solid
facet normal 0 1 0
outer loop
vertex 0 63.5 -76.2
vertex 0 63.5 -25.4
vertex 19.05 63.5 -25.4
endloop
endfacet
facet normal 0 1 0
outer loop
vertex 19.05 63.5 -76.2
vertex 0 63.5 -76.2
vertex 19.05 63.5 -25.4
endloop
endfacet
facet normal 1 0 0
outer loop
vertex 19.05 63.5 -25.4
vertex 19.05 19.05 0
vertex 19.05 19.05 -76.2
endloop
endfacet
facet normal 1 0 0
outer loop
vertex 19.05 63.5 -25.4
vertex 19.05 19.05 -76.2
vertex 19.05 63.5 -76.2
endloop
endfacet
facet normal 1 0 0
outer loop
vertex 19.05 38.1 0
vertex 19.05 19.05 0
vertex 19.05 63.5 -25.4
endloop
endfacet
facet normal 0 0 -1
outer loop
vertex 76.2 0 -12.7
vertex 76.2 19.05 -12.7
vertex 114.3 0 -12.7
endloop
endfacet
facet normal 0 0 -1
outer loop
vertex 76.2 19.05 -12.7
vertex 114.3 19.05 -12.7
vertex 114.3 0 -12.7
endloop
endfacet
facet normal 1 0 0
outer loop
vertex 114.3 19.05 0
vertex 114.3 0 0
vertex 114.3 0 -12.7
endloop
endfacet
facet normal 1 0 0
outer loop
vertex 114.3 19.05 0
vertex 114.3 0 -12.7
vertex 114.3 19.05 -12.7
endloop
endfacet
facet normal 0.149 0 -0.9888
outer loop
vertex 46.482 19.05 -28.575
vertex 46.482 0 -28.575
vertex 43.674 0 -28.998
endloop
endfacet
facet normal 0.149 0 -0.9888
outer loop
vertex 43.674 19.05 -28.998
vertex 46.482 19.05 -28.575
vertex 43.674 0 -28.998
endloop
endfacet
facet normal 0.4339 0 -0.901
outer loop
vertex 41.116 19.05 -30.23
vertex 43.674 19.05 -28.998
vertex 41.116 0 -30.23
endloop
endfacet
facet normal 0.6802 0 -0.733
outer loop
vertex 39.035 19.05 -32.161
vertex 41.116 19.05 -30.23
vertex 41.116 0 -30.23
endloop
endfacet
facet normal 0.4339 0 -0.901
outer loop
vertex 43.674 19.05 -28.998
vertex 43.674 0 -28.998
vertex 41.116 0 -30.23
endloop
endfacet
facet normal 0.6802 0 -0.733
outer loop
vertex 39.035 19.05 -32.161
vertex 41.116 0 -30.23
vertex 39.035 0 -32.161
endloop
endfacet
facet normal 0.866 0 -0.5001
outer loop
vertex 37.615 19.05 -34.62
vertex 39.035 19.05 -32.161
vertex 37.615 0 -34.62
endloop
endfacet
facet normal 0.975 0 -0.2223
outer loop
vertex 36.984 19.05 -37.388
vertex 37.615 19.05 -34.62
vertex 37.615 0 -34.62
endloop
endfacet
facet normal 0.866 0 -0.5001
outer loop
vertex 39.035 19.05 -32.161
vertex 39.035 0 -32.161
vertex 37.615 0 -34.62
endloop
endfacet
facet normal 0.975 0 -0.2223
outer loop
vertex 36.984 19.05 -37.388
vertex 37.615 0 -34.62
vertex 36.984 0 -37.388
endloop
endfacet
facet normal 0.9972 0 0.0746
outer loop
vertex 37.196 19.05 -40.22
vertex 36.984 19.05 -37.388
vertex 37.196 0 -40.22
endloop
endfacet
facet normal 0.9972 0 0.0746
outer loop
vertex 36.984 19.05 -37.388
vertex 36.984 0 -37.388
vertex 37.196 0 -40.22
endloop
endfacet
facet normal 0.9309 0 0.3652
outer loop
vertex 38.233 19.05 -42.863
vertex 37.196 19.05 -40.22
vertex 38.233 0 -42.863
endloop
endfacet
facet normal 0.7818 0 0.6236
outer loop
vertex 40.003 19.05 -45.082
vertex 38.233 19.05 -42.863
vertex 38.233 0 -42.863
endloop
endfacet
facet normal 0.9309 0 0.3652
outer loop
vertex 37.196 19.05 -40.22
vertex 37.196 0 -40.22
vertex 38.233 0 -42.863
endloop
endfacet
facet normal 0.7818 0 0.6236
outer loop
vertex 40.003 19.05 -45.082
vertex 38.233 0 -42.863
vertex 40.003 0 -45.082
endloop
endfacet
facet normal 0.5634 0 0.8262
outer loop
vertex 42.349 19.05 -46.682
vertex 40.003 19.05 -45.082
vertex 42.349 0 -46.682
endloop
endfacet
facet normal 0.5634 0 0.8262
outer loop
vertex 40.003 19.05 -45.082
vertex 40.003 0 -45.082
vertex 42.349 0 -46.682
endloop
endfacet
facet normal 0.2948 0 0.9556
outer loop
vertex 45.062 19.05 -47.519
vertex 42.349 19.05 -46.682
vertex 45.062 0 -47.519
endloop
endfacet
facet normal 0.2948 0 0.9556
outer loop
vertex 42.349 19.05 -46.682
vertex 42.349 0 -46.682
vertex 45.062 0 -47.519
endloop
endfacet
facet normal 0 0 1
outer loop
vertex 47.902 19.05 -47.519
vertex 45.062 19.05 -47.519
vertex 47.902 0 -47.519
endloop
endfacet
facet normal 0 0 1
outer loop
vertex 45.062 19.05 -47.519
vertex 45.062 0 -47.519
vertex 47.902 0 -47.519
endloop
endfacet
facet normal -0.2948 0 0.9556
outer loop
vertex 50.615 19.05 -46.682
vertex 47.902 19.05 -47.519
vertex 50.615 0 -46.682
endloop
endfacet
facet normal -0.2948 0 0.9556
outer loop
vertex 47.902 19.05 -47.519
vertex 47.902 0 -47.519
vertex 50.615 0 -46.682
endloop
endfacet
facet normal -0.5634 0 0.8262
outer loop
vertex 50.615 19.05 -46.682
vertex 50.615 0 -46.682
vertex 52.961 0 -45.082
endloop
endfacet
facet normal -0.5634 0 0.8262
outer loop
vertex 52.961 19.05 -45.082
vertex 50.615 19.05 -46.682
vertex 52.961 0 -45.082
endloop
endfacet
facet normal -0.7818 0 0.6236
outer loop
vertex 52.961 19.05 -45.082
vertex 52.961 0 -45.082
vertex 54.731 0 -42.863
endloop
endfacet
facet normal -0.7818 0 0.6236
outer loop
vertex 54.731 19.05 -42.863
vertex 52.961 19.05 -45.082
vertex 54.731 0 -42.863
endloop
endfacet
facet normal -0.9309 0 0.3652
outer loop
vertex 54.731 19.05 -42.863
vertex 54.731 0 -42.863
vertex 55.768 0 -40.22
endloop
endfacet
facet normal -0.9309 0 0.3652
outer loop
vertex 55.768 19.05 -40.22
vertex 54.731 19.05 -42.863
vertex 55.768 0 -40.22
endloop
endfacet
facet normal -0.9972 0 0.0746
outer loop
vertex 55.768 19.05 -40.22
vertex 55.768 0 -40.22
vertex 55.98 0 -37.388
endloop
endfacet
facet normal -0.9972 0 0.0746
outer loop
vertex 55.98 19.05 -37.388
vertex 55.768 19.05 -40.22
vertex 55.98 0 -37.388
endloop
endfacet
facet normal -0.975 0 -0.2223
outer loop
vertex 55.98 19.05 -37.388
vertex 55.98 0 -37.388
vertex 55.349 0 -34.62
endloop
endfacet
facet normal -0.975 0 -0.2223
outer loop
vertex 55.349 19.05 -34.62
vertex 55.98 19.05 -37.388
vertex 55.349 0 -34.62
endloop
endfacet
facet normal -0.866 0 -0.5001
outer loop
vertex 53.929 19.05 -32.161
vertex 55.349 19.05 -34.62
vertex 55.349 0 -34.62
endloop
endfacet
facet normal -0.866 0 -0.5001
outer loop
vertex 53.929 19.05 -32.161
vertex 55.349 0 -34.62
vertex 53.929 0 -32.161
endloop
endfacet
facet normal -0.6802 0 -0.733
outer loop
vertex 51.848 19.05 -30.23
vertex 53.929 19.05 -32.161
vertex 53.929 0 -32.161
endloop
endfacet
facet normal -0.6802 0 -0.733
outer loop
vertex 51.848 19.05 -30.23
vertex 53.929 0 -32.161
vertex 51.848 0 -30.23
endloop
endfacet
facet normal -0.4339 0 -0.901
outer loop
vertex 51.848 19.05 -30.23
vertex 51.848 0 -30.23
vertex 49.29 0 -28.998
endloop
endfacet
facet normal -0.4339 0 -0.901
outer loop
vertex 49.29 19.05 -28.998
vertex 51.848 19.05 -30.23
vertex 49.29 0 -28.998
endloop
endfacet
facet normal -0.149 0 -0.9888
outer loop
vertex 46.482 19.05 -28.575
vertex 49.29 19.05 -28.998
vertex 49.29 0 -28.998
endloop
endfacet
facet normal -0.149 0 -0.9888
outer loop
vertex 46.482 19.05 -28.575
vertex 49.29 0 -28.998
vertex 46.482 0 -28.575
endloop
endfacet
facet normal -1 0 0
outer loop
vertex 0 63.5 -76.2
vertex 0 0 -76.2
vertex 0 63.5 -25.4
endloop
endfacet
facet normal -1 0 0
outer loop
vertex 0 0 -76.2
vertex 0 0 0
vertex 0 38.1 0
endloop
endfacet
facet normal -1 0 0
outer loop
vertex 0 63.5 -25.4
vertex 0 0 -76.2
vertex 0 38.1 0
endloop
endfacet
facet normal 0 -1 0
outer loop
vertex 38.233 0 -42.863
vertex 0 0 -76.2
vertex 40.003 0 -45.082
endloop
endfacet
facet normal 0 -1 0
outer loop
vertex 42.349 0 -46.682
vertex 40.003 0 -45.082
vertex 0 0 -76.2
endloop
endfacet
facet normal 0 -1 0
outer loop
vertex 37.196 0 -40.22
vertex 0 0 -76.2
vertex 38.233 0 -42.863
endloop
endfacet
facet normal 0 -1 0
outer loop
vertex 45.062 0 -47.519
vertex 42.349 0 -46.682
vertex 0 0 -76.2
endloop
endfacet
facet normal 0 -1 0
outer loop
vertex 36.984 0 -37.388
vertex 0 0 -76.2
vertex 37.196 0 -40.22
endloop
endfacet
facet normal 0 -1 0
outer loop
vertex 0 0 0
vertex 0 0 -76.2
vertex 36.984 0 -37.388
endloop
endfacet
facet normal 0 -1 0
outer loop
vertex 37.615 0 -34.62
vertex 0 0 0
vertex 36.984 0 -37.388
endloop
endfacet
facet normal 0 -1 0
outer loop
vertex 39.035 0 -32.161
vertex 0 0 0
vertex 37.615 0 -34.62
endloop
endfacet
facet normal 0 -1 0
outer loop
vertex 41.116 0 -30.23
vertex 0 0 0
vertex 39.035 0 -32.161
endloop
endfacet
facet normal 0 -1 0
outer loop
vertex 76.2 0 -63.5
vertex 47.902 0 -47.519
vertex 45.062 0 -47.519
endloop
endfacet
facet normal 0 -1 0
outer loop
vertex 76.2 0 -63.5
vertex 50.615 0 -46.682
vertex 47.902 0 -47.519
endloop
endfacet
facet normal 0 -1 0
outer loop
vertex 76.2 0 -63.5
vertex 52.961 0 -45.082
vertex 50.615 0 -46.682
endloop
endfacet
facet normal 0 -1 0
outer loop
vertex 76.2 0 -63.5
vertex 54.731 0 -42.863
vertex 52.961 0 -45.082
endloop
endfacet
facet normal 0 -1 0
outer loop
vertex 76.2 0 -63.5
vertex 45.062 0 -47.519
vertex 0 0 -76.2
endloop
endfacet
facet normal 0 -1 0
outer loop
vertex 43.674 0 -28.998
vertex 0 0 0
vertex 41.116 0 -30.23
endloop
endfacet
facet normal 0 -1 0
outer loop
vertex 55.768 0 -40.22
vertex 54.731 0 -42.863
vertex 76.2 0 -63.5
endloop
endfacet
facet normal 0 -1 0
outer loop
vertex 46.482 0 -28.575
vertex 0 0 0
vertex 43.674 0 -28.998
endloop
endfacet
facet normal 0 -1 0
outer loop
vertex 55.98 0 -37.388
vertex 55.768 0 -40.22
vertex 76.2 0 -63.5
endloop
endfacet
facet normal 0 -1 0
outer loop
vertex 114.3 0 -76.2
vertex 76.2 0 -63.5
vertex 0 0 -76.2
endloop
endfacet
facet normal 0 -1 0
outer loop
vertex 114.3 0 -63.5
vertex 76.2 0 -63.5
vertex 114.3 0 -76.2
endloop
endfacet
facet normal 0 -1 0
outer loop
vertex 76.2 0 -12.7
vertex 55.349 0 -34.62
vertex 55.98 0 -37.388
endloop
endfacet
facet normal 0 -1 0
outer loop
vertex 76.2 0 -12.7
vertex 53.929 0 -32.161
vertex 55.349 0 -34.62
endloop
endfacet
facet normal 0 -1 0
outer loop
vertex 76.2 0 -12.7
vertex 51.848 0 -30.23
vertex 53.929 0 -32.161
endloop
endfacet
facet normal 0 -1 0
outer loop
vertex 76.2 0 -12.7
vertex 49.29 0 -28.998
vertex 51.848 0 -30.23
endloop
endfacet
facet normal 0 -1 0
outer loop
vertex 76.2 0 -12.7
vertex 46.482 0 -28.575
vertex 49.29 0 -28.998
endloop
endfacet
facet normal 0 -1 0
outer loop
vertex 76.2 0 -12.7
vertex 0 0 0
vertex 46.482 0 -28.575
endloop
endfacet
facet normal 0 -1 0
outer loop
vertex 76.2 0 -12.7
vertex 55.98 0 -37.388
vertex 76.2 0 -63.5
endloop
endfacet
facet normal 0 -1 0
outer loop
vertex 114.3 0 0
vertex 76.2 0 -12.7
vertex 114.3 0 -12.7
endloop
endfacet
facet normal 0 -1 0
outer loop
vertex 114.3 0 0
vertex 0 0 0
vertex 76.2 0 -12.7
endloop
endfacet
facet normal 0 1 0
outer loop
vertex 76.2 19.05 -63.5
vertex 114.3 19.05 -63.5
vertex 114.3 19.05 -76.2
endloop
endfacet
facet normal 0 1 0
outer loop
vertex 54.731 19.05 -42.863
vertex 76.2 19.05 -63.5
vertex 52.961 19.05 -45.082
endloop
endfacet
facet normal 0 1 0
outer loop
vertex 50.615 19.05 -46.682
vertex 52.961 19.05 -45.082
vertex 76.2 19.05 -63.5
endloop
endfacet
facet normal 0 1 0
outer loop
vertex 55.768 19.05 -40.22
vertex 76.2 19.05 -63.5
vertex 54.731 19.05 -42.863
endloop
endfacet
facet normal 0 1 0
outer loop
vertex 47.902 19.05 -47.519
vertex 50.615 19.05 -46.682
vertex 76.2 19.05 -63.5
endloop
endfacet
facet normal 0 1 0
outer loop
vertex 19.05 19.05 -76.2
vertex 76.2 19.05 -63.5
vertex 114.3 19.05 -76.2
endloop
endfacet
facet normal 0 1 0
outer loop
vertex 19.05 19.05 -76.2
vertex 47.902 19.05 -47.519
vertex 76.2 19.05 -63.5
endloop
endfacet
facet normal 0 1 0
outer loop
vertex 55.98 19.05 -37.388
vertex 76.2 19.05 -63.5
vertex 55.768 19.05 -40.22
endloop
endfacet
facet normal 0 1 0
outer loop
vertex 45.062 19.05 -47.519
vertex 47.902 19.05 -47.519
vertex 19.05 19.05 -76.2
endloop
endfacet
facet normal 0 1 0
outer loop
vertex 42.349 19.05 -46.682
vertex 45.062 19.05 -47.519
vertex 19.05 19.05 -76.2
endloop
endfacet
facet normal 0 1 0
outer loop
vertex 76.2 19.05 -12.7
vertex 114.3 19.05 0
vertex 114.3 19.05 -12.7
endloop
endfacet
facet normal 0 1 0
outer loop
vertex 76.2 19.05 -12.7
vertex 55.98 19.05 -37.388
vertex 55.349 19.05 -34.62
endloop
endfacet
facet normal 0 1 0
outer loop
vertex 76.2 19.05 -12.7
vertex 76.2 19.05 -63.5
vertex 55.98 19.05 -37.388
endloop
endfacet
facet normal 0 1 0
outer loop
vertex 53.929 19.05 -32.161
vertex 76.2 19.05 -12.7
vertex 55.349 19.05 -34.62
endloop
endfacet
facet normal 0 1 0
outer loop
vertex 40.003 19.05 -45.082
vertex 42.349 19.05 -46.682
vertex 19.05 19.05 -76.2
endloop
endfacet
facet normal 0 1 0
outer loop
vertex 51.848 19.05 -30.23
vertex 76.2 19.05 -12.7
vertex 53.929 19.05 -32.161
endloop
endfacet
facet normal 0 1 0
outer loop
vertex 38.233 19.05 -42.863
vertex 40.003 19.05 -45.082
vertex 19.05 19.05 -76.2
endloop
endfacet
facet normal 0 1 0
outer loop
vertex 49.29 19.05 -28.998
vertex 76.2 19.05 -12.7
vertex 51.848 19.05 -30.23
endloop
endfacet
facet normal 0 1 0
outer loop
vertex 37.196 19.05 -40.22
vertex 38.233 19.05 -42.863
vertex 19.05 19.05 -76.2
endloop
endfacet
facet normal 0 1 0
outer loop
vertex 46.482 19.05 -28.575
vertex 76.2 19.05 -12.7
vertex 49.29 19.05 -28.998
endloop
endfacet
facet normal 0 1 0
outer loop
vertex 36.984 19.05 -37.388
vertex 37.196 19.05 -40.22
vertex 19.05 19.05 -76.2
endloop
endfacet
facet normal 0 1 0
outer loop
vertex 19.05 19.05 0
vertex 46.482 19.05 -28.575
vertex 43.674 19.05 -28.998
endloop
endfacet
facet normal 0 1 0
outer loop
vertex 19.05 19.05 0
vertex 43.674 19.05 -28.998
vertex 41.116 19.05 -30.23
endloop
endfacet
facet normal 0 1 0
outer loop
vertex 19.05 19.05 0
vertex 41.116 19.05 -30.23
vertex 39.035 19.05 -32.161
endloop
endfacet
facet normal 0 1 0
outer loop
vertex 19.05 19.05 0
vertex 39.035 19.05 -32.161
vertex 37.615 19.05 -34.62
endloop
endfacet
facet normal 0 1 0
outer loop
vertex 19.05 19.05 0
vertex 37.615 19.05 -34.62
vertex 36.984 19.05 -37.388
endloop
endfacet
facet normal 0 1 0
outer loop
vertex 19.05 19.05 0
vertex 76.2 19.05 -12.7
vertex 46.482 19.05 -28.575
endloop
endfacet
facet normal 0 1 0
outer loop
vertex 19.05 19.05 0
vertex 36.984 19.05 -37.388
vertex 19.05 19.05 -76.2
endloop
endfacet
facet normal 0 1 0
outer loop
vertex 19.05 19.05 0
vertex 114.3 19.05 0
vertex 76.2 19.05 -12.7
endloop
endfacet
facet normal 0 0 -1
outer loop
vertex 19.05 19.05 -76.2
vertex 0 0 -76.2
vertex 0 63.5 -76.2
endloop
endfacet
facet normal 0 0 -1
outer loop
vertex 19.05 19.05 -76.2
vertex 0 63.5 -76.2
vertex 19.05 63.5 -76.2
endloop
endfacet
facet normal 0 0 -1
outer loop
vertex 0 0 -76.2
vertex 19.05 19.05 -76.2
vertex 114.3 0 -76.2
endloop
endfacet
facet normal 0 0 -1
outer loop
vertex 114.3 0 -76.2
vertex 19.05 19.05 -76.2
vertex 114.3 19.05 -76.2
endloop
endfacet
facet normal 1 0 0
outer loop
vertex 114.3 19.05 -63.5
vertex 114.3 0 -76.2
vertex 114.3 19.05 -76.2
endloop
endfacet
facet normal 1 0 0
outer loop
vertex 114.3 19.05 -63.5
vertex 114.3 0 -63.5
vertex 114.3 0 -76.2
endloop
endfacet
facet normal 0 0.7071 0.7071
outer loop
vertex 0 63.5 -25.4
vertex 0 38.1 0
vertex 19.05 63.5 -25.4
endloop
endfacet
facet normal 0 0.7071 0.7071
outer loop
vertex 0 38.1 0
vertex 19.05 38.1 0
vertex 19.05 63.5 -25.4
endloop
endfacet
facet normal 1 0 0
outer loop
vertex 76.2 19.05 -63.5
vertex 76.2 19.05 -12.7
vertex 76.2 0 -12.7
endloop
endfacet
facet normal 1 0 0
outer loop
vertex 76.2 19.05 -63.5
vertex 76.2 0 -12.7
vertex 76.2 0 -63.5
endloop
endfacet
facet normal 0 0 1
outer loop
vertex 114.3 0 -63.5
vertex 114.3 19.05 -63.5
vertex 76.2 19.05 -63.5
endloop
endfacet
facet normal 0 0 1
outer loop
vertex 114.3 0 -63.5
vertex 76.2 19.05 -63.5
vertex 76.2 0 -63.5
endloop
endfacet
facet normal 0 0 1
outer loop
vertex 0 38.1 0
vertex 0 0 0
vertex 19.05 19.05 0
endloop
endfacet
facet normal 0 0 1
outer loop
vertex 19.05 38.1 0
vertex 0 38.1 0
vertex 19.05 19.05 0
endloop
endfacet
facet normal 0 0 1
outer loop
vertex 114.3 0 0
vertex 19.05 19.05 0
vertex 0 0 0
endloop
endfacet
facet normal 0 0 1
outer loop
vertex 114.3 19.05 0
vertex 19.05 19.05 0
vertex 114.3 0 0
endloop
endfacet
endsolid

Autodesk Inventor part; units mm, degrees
ref_plane "YZ Plane" through (0, 0, 0) normal (1, 0, 0) x (0, 1, 0)
ref_plane "XZ Plane" through (0, 0, 0) normal (0, 1, 0) x (-1, 0, 0)
ref_plane "XY Plane" through (0, 0, 0) normal (0, 0, 1) x (1, 0, 0)
sketch "Sketch1" plane through (0, 0, 0) normal (0, 0, 1) x (1, 0, 0)
  line L0 (0, 0) -> (114.3, 0)
  line L1 (0, 0) -> (0, 63.5)
  line L2 (0, 63.5) -> (19.05, 63.5)
  line L3 (114.3, 0) -> (114.3, 19.05)
  line L4 (114.3, 19.05) -> (19.05, 19.05)
  line L5 (19.05, 19.05) -> (19.05, 63.5)
  dimension "d0" = 114.3
  dimension "d1" = 63.5
  dimension "d2" = 19.05
  dimension "d3" = 19.05
extrude "Extrusion1" add sketch "Sketch1" against normal blind 76.2
sketch "Sketch2" plane through (19.05, 19.05, 0) normal (1, 0, 0) x (0, 0, -1)
  line L0 (76.2, -19.05) -> (76.2, 44.45) projected
  line L1 (0, 44.45) -> (76.2, 44.45) projected
  line L2 (25.4, 44.45) -> (0, 44.45)
  line L3 (0, 44.45) -> (0, 19.05)
  line L4 (0, 44.45) -> (0, -19.05) projected
  line L5 (0, 19.05) -> (25.4, 44.45)
  dimension "d7" = 25.4
extrude "Extrusion2" cut sketch "Sketch2" against normal through all
sketch "Sketch3" plane through (114.3, 0, 0) normal (1, 0, 0) x (0, 0, -1)
  line L0 (12.7, 19.05) -> (12.7, 0)
  line L1 (0, 0) -> (76.2, 0) projected
  line L2 (12.7, 19.05) -> (63.5, 19.05)
  line L3 (0, 19.05) -> (76.2, 19.05) projected
  line L4 (63.5, 19.05) -> (63.5, 0)
  line L5 (12.7, 0) -> (63.5, 0)
  dimension "d11" = 50.8
extrude "Extrusion3" cut sketch "Sketch3" against normal blind 38.1
sketch "Sketch4" plane through (19.05, 19.05, 0) normal (0, 1, 0) x (1, 0, 0)
  line L0 (95.25, 0) -> (0, 0) projected
  line L1 (95.25, 0) -> (95.25, 12.7) projected
  point P0 (-19.05, 0)
  point P1 (27.432, 38.1)
  dimension "d14" = 38.1
  dimension "d15" = 67.818
hole "Hole1" at (46.482, 19.05, -38.1) direction (0, -1, 0) diameter 19.05 end through all
properties part number "Assignment 3.6 - L-Bracket"
